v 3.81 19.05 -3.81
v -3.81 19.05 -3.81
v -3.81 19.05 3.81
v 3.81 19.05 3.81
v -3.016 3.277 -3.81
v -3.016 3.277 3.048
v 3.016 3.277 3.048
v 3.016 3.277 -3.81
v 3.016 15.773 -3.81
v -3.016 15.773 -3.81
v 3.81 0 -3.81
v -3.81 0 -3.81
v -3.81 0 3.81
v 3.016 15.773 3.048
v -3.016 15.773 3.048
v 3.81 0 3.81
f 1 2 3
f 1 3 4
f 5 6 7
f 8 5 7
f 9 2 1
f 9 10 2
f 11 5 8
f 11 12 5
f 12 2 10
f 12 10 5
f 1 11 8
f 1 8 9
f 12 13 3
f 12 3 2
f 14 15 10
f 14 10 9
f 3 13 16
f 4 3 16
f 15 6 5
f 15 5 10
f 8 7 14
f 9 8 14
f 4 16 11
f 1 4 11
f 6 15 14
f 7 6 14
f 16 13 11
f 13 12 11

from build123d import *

# Parameters (mm, degrees)
SKETCH1_W           = 7.62
SKETCH1_H           = 7.62
BOSS_EXTRUDE1_DEPTH = 19.05
SKETCH2_W           = 6.032118198
SKETCH2_H           = 12.495149586
CUT_EXTRUDE1_DEPTH  = 8.62
SKETCH4_W           = 7.62
SKETCH4_H           = 19.05
BOSS_EXTRUDE3_DEPTH = 0.762


with BuildPart() as part:
    # Sketch1 → Boss-Extrude1 (new body)
    with BuildSketch(Plane(origin=(0, 0, 0), x_dir=(1, 0, 0), z_dir=(0, 1, 0))):
        Rectangle(SKETCH1_W, SKETCH1_H)
    extrude(amount=BOSS_EXTRUDE1_DEPTH)

    # Sketch2 → Cut-Extrude1 (cut, through all)
    with BuildSketch(Plane.XY.offset(3.81)):
        with Locations((0, 9.525)):
            Rectangle(SKETCH2_W, SKETCH2_H)
    extrude(amount=-CUT_EXTRUDE1_DEPTH, mode=Mode.SUBTRACT)

    # Sketch4 → Boss-Extrude3 (add)
    with BuildSketch(Plane.XY.offset(3.81)):
        with Locations((0, 9.525)):
            Rectangle(SKETCH4_W, SKETCH4_H)
    extrude(amount=-BOSS_EXTRUDE3_DEPTH)


solid = part.part
